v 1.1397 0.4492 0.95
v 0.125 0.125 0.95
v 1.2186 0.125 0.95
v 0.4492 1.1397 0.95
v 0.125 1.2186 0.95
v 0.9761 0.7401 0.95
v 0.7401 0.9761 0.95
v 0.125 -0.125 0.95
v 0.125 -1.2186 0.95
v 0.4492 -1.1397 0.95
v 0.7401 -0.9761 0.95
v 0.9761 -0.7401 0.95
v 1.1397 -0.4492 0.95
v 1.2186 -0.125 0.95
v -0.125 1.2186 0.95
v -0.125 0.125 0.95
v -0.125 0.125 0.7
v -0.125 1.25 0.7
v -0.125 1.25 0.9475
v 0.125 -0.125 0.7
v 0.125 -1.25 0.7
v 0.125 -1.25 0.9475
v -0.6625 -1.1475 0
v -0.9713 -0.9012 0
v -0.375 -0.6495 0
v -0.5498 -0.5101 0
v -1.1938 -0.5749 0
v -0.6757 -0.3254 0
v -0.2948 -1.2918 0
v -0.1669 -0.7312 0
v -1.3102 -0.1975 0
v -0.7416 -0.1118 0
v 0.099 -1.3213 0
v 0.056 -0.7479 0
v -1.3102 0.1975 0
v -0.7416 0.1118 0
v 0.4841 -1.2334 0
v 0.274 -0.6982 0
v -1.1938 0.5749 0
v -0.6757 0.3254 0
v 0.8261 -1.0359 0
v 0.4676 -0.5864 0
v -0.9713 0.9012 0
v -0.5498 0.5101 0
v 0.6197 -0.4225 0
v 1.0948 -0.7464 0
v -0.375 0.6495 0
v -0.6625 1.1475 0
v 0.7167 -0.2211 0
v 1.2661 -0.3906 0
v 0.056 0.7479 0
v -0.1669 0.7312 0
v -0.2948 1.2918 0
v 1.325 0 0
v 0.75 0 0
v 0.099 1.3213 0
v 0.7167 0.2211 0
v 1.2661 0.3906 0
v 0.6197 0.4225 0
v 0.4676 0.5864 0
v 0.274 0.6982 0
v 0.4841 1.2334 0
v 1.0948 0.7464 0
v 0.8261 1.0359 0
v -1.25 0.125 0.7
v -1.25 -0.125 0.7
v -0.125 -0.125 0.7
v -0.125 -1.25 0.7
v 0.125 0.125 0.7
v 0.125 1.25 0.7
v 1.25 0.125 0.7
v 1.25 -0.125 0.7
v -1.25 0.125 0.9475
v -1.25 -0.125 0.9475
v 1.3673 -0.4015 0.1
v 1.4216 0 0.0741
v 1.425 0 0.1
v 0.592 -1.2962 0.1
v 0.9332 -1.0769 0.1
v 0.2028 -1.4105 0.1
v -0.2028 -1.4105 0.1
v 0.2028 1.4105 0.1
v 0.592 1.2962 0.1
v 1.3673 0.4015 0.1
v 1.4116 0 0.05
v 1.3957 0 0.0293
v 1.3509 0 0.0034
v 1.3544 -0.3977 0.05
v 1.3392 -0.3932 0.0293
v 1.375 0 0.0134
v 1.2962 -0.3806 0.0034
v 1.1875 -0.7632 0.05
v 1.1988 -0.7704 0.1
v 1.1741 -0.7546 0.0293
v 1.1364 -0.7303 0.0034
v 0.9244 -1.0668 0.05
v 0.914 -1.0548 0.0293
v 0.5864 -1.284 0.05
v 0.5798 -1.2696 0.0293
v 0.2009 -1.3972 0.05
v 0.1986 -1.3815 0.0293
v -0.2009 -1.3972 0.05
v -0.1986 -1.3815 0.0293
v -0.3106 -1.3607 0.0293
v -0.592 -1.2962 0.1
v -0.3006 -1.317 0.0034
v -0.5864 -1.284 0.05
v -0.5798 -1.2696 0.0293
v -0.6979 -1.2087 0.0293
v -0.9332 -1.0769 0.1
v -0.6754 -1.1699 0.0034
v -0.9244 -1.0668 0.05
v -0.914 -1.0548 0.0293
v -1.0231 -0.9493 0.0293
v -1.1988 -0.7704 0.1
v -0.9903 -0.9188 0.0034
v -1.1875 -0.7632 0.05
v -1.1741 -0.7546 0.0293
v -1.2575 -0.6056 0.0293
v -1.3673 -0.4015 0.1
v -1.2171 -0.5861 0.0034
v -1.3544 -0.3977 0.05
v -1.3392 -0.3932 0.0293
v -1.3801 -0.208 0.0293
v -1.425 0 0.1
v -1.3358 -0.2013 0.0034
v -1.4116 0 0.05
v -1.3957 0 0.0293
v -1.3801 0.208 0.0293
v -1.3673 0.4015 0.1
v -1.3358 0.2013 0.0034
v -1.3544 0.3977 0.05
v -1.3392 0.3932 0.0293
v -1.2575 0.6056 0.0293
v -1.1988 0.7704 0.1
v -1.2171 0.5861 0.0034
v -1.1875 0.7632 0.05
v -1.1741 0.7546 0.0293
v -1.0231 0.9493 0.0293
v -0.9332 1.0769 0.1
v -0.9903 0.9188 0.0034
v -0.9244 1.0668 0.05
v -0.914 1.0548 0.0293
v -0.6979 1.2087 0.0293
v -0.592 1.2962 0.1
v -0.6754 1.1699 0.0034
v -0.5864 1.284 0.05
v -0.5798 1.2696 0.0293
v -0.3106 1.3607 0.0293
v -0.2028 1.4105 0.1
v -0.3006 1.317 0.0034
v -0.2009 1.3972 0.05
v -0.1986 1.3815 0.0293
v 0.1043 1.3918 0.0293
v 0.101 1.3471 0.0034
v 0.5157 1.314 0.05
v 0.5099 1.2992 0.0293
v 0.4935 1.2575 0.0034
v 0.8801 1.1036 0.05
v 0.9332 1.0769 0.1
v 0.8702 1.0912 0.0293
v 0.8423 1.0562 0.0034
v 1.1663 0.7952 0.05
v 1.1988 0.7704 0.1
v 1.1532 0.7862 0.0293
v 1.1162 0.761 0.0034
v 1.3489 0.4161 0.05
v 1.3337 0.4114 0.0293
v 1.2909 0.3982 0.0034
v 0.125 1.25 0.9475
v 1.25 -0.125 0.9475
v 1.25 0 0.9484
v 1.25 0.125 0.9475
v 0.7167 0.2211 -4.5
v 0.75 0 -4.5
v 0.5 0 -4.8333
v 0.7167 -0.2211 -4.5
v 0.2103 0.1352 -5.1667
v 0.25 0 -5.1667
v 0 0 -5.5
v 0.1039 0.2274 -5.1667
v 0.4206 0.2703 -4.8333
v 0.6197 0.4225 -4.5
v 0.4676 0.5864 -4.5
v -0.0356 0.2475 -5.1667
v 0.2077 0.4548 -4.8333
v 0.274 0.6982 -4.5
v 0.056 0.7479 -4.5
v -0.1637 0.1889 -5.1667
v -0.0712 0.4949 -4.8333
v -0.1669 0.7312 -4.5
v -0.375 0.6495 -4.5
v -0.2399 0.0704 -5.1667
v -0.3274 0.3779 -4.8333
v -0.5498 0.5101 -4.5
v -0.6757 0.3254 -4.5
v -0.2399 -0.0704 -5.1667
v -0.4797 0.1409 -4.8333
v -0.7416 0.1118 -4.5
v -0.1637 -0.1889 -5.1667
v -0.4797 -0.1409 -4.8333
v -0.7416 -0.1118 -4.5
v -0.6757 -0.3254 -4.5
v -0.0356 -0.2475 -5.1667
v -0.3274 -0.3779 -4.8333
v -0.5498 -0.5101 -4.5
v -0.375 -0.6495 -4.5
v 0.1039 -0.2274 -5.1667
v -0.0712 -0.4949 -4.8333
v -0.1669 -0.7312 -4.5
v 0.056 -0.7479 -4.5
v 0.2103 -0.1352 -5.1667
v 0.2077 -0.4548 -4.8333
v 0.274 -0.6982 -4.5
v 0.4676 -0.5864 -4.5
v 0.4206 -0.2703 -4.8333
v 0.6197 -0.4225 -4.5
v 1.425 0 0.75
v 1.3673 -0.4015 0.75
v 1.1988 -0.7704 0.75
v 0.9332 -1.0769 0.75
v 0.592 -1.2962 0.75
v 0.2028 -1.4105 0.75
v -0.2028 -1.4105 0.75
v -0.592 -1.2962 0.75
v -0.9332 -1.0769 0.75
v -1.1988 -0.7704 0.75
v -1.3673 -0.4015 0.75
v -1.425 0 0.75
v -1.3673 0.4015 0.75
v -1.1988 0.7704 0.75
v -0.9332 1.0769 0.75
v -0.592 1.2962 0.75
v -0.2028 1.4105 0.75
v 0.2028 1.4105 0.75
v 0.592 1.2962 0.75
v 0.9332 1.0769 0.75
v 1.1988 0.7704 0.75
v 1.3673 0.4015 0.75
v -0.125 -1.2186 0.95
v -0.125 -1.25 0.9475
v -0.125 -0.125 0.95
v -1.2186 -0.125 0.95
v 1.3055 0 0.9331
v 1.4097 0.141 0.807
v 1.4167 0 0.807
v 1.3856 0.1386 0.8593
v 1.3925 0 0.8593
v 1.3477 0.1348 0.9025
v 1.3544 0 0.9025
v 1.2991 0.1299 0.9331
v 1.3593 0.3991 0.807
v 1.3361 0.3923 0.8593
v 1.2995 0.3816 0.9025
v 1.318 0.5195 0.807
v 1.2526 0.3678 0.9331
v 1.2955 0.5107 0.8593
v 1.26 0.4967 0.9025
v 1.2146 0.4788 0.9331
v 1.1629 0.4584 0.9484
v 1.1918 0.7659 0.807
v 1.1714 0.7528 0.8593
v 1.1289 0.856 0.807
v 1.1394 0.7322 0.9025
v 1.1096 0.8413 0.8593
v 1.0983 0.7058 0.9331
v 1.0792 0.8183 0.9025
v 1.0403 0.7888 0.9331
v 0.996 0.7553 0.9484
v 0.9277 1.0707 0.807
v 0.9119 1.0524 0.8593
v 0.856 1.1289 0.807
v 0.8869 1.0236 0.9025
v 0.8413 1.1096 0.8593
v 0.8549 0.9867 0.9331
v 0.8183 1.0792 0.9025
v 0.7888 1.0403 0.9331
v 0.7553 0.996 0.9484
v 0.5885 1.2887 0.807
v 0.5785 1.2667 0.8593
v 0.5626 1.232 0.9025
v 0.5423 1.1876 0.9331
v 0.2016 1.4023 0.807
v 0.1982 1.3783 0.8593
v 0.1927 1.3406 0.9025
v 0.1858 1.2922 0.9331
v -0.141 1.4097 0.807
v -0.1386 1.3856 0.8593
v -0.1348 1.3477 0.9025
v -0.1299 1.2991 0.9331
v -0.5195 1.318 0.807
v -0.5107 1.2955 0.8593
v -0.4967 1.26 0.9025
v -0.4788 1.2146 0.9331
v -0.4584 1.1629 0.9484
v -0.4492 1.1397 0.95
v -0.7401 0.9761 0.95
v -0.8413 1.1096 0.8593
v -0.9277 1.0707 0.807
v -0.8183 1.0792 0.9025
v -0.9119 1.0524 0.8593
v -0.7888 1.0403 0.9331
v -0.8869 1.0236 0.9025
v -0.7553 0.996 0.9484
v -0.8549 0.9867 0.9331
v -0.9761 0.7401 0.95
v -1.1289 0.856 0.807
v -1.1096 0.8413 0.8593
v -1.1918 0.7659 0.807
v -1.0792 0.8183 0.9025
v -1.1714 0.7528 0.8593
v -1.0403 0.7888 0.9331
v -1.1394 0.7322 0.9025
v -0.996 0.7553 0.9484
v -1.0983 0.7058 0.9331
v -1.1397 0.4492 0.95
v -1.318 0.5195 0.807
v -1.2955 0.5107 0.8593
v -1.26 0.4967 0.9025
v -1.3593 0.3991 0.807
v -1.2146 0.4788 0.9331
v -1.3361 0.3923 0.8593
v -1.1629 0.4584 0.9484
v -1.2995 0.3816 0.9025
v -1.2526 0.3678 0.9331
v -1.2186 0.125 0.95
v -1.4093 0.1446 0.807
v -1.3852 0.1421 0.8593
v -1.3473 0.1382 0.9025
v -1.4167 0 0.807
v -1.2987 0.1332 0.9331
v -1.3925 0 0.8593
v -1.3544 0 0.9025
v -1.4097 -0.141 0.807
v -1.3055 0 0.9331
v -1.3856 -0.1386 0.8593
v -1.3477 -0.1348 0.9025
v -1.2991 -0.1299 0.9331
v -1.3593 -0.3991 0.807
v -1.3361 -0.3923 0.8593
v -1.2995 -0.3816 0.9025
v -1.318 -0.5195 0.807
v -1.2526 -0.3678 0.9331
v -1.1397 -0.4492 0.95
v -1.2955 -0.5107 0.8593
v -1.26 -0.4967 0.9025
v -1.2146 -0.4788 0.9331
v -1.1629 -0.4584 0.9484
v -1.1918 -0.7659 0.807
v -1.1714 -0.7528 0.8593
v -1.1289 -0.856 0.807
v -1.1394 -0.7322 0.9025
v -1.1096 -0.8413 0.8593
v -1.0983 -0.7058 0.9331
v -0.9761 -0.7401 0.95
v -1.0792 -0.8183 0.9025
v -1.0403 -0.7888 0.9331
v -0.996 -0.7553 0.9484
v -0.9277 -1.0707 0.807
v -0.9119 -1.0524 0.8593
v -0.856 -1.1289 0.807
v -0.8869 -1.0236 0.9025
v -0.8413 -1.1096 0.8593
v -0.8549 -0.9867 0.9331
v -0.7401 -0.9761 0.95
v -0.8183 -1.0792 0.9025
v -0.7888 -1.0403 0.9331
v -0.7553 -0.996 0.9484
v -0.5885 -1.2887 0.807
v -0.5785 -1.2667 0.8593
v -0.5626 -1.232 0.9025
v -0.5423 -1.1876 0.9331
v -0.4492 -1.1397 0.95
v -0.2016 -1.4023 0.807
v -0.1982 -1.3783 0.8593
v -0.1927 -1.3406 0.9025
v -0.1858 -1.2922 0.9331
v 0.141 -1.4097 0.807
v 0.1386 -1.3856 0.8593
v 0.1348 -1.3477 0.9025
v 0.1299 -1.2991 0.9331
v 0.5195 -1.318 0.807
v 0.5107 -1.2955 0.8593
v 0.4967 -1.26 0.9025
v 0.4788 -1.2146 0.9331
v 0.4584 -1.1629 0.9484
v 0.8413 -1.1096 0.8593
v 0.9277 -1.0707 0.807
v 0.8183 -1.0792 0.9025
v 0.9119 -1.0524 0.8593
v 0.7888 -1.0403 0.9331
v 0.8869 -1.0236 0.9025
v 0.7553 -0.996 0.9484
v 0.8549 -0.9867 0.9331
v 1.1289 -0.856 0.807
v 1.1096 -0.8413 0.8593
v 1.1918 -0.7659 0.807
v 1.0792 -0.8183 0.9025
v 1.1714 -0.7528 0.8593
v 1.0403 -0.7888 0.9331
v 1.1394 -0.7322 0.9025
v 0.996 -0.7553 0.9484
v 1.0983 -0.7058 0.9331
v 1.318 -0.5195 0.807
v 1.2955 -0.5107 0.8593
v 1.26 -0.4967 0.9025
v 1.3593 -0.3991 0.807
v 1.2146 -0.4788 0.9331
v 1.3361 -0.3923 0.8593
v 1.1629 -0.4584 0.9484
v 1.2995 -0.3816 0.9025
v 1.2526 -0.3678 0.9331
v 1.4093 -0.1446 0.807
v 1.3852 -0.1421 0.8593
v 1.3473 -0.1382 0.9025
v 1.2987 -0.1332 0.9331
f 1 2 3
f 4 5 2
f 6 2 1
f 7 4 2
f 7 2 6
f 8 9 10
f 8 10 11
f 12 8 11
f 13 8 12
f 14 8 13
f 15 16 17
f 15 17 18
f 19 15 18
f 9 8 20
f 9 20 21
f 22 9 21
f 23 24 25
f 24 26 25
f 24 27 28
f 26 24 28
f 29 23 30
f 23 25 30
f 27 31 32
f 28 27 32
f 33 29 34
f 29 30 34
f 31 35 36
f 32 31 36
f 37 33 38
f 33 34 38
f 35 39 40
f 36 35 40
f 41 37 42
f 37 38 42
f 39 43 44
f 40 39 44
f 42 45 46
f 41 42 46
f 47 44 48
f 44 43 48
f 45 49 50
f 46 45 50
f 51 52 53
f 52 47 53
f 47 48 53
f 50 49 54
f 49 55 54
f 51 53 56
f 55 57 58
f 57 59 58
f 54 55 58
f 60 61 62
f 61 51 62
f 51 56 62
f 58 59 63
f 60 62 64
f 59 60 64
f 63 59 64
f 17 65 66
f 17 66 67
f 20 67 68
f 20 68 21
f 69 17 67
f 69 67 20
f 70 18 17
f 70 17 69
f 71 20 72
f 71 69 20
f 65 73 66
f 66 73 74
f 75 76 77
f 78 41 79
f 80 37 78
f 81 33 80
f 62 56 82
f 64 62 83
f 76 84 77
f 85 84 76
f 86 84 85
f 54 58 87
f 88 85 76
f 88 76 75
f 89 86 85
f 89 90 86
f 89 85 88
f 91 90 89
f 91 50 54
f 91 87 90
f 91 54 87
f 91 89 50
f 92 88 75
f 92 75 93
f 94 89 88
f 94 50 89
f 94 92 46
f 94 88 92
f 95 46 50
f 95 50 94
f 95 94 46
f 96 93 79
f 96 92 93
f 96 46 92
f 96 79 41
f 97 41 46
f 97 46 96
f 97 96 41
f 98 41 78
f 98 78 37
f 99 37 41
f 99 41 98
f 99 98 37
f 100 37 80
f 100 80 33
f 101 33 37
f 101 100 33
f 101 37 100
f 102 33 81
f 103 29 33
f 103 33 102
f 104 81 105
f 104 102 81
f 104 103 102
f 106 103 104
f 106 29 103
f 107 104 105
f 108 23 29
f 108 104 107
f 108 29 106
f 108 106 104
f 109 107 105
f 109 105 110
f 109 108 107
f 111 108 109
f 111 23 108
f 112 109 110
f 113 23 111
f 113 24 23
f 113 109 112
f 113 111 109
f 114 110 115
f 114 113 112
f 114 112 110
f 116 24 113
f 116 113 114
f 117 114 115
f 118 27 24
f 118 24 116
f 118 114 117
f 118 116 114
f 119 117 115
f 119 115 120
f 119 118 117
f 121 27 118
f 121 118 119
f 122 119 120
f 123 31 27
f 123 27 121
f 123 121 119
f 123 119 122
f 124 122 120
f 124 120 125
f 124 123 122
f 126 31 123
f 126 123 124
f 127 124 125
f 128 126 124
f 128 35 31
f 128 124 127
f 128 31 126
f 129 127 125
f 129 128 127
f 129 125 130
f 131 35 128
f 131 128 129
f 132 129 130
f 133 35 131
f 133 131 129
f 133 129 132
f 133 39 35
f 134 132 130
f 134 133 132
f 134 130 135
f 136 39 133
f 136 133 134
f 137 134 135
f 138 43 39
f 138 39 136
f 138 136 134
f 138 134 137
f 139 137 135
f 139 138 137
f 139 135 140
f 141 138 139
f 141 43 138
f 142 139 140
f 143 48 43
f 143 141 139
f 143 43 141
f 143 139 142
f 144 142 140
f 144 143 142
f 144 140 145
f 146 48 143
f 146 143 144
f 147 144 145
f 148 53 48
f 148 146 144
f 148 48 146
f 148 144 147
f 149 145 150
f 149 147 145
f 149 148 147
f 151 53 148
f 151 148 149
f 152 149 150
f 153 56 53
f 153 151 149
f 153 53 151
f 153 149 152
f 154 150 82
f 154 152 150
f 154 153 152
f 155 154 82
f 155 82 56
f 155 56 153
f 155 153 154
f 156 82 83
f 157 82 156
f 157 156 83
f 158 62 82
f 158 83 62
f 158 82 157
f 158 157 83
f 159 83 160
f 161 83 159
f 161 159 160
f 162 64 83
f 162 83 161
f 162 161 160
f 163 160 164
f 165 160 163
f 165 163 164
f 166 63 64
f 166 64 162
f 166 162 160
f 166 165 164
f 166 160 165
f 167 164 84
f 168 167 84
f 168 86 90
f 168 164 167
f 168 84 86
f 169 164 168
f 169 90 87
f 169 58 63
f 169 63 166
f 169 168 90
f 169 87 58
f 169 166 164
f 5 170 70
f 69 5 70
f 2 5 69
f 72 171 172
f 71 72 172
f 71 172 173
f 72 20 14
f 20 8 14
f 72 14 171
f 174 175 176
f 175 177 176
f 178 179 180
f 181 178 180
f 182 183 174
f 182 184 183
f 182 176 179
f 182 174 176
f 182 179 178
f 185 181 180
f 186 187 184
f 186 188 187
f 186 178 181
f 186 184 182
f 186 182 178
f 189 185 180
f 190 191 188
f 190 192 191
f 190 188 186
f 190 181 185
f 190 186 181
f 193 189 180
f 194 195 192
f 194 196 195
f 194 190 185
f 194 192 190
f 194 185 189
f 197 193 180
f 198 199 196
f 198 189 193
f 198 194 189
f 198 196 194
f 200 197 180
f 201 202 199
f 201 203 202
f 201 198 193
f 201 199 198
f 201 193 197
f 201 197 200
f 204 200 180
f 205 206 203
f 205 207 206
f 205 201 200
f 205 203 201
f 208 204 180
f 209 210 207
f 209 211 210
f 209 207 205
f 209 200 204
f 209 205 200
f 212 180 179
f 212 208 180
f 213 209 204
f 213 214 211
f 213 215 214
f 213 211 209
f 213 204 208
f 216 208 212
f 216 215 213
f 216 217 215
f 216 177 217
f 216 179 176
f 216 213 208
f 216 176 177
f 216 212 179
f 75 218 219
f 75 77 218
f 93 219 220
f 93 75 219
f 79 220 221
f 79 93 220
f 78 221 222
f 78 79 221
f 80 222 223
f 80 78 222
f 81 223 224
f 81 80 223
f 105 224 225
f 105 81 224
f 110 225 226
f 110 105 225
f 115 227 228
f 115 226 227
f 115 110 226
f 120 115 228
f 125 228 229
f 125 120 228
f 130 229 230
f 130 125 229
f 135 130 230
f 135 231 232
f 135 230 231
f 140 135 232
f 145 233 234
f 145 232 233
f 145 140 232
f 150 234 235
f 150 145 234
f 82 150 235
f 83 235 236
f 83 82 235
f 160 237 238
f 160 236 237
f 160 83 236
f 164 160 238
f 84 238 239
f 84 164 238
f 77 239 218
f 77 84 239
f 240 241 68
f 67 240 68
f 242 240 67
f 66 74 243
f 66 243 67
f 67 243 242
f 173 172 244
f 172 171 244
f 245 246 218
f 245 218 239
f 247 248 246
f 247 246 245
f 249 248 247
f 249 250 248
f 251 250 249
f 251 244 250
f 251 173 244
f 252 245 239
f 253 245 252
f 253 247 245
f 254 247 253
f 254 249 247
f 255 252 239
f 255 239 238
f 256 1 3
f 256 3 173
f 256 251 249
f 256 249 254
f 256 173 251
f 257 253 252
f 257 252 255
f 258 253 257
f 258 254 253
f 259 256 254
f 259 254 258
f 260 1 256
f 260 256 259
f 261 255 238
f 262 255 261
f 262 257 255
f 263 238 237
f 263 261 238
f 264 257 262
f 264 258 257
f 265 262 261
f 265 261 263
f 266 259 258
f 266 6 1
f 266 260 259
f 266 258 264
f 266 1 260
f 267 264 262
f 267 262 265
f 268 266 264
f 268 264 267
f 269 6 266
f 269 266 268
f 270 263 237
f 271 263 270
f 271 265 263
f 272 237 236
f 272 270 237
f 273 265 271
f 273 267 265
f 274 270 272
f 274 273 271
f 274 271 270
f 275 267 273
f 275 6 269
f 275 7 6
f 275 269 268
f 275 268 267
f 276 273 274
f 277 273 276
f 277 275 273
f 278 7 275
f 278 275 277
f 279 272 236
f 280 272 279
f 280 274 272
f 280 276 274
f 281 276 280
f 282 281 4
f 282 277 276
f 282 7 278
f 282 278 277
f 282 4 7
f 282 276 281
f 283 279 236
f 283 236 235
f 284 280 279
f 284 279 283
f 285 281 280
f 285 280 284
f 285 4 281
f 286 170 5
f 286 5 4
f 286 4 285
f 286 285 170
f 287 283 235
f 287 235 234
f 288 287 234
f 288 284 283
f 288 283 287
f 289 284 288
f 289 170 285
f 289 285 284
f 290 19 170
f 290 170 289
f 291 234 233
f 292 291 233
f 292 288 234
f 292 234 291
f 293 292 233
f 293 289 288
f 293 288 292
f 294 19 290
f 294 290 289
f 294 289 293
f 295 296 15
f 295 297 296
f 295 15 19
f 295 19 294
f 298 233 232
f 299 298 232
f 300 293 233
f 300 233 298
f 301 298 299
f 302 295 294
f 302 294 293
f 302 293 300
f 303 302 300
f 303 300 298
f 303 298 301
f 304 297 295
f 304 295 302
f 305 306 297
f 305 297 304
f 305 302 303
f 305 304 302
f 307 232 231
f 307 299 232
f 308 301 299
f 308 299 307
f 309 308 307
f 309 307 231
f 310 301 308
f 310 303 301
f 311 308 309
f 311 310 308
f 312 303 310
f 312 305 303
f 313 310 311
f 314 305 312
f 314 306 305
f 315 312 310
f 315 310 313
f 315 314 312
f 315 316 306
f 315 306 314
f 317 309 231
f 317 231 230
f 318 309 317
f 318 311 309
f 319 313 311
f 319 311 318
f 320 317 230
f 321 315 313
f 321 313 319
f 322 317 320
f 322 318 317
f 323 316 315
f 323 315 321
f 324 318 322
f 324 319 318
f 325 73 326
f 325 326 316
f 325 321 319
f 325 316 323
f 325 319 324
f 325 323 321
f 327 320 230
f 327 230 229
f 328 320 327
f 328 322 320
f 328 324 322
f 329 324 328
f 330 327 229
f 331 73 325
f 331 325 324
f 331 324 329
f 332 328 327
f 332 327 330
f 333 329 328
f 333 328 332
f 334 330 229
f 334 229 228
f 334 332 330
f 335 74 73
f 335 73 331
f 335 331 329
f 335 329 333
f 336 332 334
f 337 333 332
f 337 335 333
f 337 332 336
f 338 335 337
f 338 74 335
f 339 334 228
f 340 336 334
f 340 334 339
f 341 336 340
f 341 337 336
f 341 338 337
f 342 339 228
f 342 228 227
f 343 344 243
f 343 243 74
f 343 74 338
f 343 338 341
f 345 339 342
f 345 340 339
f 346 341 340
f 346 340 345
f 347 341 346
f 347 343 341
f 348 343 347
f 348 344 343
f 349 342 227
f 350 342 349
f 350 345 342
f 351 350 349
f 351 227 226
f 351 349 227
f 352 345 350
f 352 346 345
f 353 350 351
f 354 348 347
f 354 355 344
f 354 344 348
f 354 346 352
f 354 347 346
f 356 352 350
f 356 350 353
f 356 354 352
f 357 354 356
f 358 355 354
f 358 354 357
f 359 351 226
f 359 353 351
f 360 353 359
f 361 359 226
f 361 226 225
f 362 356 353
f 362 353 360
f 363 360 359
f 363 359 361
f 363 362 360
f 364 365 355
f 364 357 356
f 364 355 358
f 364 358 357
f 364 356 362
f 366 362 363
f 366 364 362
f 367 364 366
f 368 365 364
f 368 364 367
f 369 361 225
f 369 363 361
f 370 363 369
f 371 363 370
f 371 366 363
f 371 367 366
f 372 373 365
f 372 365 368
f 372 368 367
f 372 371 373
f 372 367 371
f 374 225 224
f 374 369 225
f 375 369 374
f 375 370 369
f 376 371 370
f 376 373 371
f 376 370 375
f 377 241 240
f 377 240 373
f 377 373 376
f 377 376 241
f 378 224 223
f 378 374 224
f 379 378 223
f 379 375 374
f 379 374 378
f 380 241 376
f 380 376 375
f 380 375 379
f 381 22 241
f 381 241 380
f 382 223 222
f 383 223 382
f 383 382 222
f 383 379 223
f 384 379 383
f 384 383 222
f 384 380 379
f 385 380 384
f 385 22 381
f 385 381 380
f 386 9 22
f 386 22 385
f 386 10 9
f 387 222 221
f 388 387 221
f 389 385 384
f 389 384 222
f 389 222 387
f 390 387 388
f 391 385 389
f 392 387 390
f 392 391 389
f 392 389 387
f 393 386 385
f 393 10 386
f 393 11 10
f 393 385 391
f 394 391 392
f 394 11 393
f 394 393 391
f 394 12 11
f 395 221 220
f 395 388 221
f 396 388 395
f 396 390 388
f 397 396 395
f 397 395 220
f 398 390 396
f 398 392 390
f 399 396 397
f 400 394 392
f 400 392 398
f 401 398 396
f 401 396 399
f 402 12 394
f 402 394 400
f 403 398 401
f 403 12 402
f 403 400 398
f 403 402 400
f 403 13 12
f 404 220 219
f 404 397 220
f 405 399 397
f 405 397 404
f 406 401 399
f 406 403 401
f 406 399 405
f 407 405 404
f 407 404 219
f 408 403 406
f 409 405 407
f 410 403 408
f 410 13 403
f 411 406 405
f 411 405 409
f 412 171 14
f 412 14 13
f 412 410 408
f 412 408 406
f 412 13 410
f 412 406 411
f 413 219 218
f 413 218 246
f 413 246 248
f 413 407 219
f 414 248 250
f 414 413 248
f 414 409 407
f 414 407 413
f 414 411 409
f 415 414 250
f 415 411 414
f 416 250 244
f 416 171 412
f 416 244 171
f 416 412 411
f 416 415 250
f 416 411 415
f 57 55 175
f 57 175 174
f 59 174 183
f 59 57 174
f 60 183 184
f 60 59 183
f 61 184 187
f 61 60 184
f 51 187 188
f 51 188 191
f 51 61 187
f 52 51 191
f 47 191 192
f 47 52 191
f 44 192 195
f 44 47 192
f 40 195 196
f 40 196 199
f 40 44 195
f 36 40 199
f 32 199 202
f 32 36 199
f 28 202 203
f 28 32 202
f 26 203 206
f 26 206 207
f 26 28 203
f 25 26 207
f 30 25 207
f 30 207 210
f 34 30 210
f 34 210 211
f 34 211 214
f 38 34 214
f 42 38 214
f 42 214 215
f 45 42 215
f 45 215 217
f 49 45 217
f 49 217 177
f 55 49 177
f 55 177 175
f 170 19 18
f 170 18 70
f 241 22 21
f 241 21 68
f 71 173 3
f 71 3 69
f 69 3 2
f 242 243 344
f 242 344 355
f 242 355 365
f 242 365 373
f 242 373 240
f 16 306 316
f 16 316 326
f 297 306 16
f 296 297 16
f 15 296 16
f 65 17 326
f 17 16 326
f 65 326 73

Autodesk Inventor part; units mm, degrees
ref_plane "YZ Plane" through (0, 0, 0) normal (1, 0, 0) x (0, 1, 0)
ref_plane "XZ Plane" through (0, 0, 0) normal (0, 1, 0) x (-1, 0, 0)
ref_plane "XY Plane" through (0, 0, 0) normal (0, 0, 1) x (1, 0, 0)
sketch "Sketch1" plane through (0, 0, 0) normal (0, 0, 1) x (1, 0, 0)
  circle A0 centre (0, 0) radius 0.75
  dimension "d0" = 1.5
extrude "Extrusion1" add sketch "Sketch1" against normal blind 5.5
sketch "Sketch2" plane through (0, 0, 0) normal (0, 0, 1) x (1, 0, 0)
  circle A0 centre (0, 0) radius 1.425
  dimension "d3" = 2.85
extrude "Extrusion2" add sketch "Sketch2" along normal blind 0.95
chamfer "Chamfer1" distance 0.75 distance2 1 1 edges at (-0.75, 0, -5.5) measured on face at (0.5185, -0.1278, -5.5)
fillet "Fillet1" radius 0.2 1 edges at (-1.425, 0, 0.95)
fillet "Fillet2" radius 0.1 1 edges at (-1.425, 0, 0)
sketch "Sketch3" plane through (0, 0, 0.95) normal (0, 0, 1) x (1, 0, 0)
  line L0 (1.25, 0.125) -> (-1.25, 0.125)
  line L1 (-1.25, 0.125) -> (-1.25, -0.125)
  line L2 (-1.25, -0.125) -> (1.25, -0.125)
  line L3 (1.25, -0.125) -> (1.25, 0.125)
  line L4 (1.25, 0.125) -> (-1.25, -0.125) construction
  line L5 (-1.25, 0.125) -> (1.25, -0.125) construction
  line L6 (0.125, -1.25) -> (-0.125, -1.25)
  line L7 (-0.125, -1.25) -> (-0.125, 1.25)
  line L8 (-0.125, 1.25) -> (0.125, 1.25)
  line L9 (0.125, 1.25) -> (0.125, -1.25)
  line L10 (0.125, -1.25) -> (-0.125, 1.25) construction
  line L11 (-0.125, -1.25) -> (0.125, 1.25) construction
  point P0 (0, 0)
  point P1 (0, 0)
  dimension "d11" = 2.5
  dimension "d12" = 0.25
  dimension "d13" = 0.25
  dimension "d14" = 2.5
extrude "Extrusion3" cut sketch "Sketch3" against normal blind 0.25
thread "Thread1" size "M1.7x0.35" class "6g" standard "ANSI Metric M Profile" full length
equation "\"d6\" = 0.5 * d0"
properties part number "M1.7_6mm self-tapping screw"
